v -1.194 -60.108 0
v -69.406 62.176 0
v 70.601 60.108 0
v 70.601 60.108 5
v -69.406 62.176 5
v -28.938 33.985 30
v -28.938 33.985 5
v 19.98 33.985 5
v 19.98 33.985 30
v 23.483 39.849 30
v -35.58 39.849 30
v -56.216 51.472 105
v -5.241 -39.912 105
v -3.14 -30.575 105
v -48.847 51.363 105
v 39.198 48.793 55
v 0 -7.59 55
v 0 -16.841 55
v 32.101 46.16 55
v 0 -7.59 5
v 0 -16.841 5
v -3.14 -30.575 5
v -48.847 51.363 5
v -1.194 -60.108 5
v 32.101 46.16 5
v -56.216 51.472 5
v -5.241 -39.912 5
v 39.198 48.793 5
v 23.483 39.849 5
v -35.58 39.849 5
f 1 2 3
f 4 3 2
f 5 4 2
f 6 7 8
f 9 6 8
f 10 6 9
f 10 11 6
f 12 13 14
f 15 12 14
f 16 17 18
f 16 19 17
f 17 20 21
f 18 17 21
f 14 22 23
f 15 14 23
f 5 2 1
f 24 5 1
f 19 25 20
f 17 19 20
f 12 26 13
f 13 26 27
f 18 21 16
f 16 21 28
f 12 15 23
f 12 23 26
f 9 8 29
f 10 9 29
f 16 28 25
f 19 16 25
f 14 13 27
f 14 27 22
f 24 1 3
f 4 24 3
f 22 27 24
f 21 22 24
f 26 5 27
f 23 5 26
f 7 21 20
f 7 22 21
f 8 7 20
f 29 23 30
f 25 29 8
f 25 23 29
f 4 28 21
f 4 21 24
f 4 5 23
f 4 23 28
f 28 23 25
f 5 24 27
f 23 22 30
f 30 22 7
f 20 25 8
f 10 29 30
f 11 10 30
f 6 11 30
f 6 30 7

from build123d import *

# Parameters (mm, degrees)
F1_DEPTH = 5
F3_DEPTH = 100
F4_DEPTH = 50
F5_DEPTH = 25


with BuildPart() as f1:
    # F0 (on Top) → F1 (new body)
    with BuildSketch(Plane.XY):
        Polygon((-1.194454, -60.107594), (70.600725, 60.107594), (-69.406271, 62.176449), align=None)
    extrude(amount=F1_DEPTH)

    # F2 (on face) → F3 (join)
    with BuildSketch(Plane.XY.offset(5)):
        Polygon((-48.847037, 51.363251), (-56.216117, 51.472142), (-5.24076, -39.911917), (-3.140415, -30.575492), align=None)
    extrude(amount=F3_DEPTH)

    # F2 (on face) → F4 (join)
    with BuildSketch(Plane.XY.offset(5)):
        Polygon((0, -7.590361), (0, -16.841115), (39.198391, 48.793401), (32.101094, 46.160308), align=None)
    extrude(amount=F4_DEPTH)

    # F2 (on face) → F5 (join)
    with BuildSketch(Plane.XY.offset(5)):
        Polygon((23.482682, 39.849401), (-35.579819, 39.849401), (-28.938254, 33.985027), (19.980348, 33.985027), align=None)
    extrude(amount=F5_DEPTH)


solid = f1.part
